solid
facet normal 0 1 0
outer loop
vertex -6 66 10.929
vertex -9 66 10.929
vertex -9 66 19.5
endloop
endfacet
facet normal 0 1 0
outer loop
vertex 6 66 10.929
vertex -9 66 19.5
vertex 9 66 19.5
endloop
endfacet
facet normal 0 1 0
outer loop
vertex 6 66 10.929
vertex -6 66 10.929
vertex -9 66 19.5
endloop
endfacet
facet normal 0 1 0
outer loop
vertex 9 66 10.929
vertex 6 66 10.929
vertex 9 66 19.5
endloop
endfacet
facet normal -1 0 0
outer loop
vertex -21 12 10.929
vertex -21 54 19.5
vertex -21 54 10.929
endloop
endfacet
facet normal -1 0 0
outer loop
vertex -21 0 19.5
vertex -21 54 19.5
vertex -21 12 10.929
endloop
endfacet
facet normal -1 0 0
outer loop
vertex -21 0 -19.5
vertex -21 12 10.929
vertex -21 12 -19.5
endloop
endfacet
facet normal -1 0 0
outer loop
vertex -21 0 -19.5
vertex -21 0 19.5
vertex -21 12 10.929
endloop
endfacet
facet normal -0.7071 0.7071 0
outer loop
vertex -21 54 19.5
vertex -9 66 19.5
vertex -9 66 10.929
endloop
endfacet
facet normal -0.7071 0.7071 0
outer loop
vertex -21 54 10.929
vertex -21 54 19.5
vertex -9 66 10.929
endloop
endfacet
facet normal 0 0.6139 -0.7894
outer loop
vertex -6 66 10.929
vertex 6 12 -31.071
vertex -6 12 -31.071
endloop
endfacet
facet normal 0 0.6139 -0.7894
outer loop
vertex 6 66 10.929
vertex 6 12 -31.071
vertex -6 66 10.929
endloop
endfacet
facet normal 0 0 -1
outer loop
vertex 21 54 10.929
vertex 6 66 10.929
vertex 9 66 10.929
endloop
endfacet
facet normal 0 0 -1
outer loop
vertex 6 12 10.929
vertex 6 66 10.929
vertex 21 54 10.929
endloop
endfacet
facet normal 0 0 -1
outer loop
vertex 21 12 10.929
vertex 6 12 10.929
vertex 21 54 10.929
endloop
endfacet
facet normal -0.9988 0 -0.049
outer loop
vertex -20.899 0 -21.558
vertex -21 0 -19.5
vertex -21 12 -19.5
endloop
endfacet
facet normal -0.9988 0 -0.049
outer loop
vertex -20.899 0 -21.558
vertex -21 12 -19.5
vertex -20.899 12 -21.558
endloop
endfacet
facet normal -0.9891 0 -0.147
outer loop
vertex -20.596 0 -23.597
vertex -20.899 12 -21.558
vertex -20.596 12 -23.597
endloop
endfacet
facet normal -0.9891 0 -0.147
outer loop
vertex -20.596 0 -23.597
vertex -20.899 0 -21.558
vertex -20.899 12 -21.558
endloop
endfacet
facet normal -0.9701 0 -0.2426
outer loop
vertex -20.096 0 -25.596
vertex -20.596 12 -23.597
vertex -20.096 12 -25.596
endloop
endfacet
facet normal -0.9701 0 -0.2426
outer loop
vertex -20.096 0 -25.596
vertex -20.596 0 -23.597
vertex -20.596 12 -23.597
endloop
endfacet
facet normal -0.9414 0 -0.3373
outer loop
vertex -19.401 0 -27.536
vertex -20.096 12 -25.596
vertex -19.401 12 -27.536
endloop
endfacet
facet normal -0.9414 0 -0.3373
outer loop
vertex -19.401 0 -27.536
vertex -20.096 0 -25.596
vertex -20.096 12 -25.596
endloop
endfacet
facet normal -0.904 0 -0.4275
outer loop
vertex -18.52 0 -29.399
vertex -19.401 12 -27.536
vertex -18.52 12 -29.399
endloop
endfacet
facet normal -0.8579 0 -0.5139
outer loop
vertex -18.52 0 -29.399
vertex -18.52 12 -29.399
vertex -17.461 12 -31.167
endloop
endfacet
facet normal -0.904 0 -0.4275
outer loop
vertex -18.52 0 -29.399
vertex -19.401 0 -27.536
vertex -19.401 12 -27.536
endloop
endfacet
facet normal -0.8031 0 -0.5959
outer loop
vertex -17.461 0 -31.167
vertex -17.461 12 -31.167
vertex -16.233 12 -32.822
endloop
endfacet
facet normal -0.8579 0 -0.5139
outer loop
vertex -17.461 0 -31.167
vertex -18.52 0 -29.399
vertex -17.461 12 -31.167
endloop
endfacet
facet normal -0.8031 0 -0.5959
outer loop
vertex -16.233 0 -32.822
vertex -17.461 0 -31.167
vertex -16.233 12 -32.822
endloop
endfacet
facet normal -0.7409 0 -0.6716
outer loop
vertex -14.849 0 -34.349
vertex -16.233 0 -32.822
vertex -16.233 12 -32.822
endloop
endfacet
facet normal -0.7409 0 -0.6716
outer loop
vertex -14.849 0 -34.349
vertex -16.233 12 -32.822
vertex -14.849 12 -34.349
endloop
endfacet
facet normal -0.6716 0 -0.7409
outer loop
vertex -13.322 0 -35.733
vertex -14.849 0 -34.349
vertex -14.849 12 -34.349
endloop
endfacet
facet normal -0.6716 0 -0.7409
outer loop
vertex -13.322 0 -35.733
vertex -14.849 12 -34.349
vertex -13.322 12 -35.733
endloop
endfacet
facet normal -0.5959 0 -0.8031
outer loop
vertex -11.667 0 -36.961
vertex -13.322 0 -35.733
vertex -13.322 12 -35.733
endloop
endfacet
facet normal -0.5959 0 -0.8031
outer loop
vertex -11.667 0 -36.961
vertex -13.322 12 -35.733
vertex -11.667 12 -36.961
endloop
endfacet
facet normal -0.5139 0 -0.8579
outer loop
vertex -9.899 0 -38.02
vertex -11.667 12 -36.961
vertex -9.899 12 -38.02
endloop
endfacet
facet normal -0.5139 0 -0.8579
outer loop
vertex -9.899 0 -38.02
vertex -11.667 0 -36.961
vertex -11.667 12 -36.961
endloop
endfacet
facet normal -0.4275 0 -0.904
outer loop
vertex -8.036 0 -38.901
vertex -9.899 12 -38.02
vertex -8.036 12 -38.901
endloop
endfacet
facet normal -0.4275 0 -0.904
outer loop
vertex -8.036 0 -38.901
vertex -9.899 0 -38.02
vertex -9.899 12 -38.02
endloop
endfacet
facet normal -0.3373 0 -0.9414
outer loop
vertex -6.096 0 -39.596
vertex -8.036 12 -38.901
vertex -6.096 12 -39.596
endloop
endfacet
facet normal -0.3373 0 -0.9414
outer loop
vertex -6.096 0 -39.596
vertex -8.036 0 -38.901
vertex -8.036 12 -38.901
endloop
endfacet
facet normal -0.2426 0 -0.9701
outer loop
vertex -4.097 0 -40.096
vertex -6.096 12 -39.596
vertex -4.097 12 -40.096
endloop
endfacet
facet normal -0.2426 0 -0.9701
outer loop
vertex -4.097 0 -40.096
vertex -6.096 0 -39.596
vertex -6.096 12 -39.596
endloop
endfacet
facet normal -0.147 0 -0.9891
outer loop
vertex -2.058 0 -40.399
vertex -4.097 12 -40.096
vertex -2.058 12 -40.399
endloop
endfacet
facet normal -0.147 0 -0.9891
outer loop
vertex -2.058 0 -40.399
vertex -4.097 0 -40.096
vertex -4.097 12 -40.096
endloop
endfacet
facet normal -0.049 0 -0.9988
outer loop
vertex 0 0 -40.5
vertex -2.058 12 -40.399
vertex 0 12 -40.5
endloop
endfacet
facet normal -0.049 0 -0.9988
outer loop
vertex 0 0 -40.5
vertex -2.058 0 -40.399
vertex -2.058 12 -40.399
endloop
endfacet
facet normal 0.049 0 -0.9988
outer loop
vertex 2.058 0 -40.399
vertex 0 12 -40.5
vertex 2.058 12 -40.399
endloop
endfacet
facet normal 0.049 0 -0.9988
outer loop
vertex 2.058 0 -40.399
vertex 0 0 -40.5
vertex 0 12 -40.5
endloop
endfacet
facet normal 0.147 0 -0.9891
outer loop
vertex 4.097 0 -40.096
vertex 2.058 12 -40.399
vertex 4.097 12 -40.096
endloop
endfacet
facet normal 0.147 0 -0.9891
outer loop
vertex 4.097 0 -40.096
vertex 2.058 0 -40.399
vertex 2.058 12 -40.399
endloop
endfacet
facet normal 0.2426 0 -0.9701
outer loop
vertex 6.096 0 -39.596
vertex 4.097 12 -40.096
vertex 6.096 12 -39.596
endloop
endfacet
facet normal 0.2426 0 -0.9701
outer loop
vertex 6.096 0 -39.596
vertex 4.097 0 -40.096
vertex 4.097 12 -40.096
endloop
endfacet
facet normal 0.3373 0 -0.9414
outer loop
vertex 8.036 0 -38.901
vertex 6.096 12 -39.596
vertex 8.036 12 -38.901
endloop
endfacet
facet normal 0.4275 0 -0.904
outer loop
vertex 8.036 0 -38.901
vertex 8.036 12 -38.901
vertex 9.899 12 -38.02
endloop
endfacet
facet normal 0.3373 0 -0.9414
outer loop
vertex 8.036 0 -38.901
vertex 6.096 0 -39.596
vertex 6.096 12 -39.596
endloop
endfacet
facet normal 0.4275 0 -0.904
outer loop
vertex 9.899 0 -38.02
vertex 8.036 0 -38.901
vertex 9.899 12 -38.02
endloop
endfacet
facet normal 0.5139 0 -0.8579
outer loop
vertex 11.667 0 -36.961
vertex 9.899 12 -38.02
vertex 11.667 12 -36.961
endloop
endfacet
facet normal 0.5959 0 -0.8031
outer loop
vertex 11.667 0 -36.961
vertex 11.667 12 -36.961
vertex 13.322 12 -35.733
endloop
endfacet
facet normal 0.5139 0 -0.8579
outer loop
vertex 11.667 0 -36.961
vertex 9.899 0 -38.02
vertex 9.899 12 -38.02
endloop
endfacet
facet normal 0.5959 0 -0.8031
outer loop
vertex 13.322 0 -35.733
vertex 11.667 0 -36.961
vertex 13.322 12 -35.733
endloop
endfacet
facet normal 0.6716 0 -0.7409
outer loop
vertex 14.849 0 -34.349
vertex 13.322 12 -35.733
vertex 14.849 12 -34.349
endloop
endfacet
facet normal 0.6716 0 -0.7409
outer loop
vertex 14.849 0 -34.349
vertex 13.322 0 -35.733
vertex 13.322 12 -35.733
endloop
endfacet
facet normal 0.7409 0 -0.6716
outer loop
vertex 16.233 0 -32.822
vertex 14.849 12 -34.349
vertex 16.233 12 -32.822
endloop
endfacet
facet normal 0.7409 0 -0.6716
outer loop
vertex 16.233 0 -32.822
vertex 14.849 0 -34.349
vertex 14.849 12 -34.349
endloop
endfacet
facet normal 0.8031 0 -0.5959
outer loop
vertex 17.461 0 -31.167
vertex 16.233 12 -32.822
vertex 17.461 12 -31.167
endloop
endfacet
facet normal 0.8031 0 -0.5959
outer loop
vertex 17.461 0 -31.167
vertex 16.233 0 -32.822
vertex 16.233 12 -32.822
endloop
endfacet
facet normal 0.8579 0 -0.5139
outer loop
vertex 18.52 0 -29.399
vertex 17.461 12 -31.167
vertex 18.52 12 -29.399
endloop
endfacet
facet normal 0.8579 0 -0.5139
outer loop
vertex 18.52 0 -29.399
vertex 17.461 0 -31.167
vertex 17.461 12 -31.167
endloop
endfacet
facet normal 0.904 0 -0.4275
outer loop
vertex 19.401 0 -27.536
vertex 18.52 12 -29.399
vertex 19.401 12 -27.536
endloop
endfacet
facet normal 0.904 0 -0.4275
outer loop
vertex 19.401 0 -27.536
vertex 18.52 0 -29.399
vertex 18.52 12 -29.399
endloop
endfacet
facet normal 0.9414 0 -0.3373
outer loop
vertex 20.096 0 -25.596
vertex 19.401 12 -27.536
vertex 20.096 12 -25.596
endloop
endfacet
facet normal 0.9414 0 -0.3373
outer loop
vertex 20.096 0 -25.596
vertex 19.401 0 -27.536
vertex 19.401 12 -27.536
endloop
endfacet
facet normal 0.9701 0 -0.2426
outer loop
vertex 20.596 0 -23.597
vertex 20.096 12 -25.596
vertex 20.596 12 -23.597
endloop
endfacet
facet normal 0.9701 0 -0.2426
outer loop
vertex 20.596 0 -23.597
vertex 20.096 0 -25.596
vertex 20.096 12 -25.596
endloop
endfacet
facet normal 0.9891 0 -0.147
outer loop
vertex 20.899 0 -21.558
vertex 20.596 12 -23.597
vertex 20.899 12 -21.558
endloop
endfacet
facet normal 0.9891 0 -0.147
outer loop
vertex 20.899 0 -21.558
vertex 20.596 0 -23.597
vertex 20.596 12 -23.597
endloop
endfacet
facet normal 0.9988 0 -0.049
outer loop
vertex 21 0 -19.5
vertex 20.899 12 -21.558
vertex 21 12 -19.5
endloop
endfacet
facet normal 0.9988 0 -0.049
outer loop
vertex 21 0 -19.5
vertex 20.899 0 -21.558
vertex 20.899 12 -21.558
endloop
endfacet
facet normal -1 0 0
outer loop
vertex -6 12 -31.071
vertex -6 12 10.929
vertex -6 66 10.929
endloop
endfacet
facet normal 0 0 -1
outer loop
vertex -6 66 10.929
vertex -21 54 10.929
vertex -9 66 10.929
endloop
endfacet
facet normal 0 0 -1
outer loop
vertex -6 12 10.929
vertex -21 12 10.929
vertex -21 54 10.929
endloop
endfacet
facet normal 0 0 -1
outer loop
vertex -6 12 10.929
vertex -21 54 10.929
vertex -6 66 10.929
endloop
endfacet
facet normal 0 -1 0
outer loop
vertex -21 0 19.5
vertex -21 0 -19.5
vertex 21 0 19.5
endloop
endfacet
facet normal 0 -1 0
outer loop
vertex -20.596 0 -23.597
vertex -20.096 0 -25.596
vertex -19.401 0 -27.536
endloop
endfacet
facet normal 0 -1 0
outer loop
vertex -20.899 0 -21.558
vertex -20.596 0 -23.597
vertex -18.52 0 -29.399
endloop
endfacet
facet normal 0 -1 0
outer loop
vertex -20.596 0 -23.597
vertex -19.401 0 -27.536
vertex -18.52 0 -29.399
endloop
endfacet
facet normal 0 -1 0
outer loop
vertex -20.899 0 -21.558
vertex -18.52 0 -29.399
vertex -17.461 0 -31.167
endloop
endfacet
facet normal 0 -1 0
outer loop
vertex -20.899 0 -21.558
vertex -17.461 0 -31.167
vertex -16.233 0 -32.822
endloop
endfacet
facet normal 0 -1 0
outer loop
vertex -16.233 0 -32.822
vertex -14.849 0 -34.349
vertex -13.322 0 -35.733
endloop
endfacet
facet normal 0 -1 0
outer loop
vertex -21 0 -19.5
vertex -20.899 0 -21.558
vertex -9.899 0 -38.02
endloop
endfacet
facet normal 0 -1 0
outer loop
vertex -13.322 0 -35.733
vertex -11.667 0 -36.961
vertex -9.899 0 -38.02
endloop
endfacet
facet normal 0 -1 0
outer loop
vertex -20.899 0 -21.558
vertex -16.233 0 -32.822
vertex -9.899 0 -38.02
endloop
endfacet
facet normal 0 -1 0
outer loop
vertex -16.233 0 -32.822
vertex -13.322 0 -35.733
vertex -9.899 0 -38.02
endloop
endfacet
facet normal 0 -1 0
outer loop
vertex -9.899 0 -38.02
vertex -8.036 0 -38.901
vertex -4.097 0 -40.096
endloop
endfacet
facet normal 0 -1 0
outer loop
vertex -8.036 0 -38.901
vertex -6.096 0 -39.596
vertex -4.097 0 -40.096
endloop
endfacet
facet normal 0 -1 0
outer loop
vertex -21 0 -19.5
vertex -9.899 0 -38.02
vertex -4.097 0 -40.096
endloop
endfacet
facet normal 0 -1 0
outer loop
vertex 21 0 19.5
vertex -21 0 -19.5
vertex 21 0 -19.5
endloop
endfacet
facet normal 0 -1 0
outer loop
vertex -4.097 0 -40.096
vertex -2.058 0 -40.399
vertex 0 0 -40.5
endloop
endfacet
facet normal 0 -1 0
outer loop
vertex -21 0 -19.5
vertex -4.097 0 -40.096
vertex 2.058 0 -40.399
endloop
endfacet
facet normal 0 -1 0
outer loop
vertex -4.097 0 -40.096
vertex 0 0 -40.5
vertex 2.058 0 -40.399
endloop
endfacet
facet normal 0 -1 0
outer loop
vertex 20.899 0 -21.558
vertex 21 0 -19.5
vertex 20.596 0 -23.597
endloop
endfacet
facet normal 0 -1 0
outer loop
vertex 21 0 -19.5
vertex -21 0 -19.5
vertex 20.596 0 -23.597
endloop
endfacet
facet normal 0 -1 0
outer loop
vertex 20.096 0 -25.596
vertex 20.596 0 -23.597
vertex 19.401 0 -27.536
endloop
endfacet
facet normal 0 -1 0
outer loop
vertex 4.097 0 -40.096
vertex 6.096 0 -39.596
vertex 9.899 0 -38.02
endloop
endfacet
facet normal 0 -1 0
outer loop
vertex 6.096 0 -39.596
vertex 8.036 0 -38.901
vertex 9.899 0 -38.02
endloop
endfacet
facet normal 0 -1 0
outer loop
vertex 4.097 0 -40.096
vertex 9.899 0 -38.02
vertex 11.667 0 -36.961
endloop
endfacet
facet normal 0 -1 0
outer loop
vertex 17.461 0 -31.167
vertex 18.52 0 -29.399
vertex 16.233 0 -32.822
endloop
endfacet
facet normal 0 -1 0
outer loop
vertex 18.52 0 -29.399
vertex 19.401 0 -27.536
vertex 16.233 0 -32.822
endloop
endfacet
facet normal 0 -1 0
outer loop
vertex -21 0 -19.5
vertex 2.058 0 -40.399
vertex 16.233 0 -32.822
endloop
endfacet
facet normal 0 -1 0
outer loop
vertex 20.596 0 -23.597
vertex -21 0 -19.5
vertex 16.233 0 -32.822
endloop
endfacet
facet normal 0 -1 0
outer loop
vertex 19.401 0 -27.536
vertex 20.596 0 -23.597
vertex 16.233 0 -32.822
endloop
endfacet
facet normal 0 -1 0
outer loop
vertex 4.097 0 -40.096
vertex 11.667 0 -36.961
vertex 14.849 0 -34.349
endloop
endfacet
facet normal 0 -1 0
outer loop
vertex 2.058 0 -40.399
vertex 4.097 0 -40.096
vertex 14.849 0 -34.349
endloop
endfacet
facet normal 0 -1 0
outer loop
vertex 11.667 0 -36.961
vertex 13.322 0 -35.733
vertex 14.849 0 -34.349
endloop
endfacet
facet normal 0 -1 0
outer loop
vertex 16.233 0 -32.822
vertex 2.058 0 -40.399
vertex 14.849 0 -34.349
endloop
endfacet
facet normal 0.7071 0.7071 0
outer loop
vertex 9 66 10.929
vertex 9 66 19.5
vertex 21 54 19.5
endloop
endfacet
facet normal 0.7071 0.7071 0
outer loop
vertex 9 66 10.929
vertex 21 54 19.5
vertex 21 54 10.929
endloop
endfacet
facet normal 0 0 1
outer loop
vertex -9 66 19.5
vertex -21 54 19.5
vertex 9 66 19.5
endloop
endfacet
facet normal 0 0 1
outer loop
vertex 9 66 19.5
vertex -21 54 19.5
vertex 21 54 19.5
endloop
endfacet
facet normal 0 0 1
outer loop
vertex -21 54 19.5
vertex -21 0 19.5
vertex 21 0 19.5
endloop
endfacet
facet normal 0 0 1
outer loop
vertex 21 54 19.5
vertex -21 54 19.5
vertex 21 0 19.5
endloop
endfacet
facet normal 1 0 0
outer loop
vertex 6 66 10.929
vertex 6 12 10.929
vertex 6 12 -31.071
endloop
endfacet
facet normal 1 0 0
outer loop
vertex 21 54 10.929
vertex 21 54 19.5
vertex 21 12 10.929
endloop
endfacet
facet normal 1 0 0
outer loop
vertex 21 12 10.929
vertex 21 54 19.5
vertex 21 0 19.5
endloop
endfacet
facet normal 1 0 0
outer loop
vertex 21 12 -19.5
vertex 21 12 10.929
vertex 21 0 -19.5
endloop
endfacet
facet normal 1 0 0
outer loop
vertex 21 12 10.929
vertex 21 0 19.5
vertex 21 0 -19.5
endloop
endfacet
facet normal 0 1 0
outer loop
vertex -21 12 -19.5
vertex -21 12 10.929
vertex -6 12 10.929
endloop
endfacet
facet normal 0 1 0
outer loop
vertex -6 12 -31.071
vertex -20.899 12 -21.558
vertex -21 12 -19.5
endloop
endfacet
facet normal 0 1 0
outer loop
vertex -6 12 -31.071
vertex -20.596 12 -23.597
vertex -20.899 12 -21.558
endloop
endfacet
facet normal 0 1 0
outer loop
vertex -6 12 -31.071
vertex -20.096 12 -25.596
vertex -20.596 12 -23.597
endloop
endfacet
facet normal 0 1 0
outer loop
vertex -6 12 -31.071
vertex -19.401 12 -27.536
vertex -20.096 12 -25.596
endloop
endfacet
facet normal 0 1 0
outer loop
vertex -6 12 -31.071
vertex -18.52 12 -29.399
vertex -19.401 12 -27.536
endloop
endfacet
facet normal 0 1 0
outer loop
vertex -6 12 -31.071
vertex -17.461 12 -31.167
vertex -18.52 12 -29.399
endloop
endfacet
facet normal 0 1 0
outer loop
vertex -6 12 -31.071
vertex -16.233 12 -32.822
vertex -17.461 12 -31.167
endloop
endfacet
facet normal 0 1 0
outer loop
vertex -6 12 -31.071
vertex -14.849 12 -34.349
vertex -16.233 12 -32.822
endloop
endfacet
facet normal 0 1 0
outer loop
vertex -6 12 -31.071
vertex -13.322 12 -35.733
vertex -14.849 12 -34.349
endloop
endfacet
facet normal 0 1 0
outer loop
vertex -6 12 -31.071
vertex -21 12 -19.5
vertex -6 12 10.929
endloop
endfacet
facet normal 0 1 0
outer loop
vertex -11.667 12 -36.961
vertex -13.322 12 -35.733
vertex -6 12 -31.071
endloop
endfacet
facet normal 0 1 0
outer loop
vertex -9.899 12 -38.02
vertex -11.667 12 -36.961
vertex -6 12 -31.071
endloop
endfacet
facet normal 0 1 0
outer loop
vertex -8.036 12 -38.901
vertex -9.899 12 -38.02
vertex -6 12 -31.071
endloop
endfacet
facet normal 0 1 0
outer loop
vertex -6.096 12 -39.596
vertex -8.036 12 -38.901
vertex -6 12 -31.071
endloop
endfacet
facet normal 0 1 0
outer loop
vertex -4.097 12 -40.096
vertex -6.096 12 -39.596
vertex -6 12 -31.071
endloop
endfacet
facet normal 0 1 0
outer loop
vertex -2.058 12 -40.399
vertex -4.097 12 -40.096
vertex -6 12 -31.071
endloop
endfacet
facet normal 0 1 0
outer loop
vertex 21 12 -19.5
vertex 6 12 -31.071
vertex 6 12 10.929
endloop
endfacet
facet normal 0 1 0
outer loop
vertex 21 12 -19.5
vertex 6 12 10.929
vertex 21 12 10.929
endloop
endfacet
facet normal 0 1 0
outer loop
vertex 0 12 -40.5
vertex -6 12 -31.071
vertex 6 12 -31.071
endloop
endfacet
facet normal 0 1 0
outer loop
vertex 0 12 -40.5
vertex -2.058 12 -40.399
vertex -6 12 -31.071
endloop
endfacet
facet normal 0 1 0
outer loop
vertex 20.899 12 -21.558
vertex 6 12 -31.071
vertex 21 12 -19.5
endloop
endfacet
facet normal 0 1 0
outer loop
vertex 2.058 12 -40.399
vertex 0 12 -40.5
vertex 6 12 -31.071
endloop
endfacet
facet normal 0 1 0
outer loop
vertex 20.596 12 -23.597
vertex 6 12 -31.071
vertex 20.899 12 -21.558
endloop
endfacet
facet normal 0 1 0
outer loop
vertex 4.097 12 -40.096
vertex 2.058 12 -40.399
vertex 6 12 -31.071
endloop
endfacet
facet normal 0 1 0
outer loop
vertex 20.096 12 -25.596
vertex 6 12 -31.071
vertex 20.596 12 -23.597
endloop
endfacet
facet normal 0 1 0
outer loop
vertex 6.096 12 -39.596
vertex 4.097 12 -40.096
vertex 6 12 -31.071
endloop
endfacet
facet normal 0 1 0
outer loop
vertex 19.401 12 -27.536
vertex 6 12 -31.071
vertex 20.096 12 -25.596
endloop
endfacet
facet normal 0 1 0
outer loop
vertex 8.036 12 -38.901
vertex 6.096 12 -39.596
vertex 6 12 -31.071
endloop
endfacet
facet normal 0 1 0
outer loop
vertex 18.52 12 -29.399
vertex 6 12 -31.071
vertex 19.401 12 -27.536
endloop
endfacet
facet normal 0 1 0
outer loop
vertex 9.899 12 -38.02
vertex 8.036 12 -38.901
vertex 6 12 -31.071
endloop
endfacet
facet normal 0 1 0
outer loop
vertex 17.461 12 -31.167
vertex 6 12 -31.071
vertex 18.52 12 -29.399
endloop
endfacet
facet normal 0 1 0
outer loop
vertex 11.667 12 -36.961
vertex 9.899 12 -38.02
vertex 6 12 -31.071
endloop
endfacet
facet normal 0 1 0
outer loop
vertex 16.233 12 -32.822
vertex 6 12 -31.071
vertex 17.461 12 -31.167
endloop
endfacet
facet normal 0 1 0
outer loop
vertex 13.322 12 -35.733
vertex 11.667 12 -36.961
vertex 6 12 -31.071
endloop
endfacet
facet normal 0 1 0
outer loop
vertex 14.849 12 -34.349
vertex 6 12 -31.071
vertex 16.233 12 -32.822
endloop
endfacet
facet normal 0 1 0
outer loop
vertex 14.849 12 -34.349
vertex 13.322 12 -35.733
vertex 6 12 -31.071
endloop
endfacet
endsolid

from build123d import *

# Parameters (mm, degrees)
SKETCH1_W           = 42
SKETCH1_H           = 39
BOSS_EXTRUDE1_DEPTH = 12
SKETCH2_W           = 42
SKETCH2_H           = 8.570511372
BOSS_EXTRUDE2_DEPTH = 54
CHAMFER1_SIZE       = 12
BOSS_EXTRUDE3_DEPTH = 6


with BuildPart() as part:
    # Sketch1 → Boss-Extrude1 (new body)
    with BuildSketch(Plane(origin=(0, 0, 0), x_dir=(1, 0, 0), z_dir=(0, 1, 0))):
        Rectangle(SKETCH1_W, SKETCH1_H)
        with BuildLine():
            ThreePointArc((-21, 19.5), (0, 40.5), (21, 19.5))
            Line((21, 19.5), (-21, 19.5))
        make_face()
    extrude(amount=BOSS_EXTRUDE1_DEPTH)

    # Sketch2 → Boss-Extrude2 (add)
    with BuildSketch(Plane(origin=(0, 12, 0), x_dir=(1, 0, 0), z_dir=(0, 1, 0))):
        with Locations((0, -15.214744314)):
            Rectangle(SKETCH2_W, SKETCH2_H)
    extrude(amount=BOSS_EXTRUDE2_DEPTH)

    # Chamfer1
    chamfer1_edges = [part.edges().sort_by_distance(p)[0] for p in [
        (-21, 66, 15.214744314),
        (21, 66, 15.214744314),
    ]]
    chamfer(chamfer1_edges, length=CHAMFER1_SIZE)

    # Sketch5 → Boss-Extrude3 (add, symmetric)
    with BuildSketch(Plane(origin=(0, 0, 0), x_dir=(0, 0, -1), z_dir=(1, 0, 0))):
        Polygon((-10.929488628, 66), (-10.929488628, 12), (31.070511372, 12), align=None)
    extrude(amount=BOSS_EXTRUDE3_DEPTH, both=True)


solid = part.part
